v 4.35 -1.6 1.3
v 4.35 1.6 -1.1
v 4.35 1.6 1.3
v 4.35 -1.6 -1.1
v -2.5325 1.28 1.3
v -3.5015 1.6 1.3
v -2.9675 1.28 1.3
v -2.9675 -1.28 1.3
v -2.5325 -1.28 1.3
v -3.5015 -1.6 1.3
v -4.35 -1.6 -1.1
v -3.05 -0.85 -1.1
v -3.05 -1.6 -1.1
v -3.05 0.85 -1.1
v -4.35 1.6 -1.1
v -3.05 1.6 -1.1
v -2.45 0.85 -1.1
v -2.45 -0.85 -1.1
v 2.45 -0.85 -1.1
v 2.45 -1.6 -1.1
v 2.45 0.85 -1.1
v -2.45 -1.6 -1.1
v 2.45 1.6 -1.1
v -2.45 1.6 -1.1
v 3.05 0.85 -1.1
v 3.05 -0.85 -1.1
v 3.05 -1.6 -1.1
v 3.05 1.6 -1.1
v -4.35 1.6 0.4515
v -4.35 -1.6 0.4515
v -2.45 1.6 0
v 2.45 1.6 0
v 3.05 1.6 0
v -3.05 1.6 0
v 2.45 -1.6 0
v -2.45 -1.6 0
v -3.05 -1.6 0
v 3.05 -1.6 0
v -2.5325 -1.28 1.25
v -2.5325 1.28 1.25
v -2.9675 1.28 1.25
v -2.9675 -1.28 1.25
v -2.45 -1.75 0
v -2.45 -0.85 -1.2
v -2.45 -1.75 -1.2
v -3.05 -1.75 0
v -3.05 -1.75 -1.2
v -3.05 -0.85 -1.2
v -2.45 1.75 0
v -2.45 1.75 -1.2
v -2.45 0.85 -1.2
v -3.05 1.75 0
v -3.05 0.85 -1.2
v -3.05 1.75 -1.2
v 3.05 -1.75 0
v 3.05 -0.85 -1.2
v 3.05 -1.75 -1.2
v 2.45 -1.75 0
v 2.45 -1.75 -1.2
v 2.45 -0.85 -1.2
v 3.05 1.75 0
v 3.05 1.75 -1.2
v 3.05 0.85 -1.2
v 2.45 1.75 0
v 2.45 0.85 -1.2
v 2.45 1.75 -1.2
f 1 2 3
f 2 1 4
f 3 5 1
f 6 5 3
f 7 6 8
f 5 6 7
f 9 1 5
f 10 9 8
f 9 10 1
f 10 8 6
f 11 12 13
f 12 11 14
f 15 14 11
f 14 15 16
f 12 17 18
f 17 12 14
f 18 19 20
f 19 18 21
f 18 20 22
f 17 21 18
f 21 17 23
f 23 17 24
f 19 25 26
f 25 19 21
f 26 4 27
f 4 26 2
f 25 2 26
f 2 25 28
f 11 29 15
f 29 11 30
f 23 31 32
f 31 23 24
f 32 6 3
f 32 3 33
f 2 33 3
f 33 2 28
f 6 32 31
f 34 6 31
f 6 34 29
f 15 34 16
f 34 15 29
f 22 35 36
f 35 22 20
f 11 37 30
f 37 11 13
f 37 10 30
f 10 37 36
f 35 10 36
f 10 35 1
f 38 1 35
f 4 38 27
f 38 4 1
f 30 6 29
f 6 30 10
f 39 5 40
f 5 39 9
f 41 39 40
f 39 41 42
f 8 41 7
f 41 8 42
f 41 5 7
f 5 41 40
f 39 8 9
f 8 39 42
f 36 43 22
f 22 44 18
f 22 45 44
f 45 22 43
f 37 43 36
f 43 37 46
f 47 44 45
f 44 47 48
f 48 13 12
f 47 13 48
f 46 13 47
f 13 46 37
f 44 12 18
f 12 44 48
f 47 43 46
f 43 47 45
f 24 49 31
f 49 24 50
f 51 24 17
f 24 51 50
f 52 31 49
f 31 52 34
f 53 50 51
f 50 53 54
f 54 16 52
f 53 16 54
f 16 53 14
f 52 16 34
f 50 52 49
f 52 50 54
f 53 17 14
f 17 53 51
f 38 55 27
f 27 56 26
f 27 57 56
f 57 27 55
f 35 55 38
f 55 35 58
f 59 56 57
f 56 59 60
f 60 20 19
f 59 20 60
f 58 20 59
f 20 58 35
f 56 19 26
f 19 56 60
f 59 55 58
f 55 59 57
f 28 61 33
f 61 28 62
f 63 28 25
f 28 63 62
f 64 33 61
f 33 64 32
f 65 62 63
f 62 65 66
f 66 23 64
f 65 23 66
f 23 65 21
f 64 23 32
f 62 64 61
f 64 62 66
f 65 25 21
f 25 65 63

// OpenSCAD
dim=[8.7, 3.2, 2.4];
color_body=[0.15,0.15,0.15]; // dark gray
above=0.1;

// pad_pos=[5.5, 2.3]; // pads raster (assumed touching z=0)
pin_pos=[5.5, 2.6]; // pins centers at z=0
dim_pin=[0.6,0.9,1.2]; // simple pin
color_pin="white";

color_writing="white";


module abs25()
{
  translate([0,0,above])
  difference()
  {
    color(color_body)
      cube(dim, center=true);
    // body cut pin 1 mark
    translate([-dim[0]/2,0,dim[2]/2])
    rotate([0,-45,0])
      color(color_body)
        cube([dim[1]*0.5,dim[1]+0.1,dim[2]*0.5],center=true);
    // white cut pin 1 marking
    translate([-pin_pos[0]/2,0,dim[2]/2])
      color(color_writing)
        cube([dim[0]*0.05,dim[1]*0.8,0.1],center=true);
  }
  // add pins
  for(i=[-1:2:1])
    for(j=[-1:2:1])
      translate([i*pin_pos[0]/2,j*pin_pos[1]/2,-dim_pin[2]/2])
        color(color_pin)
          cube(dim_pin,center=true);
}

// scale(1/2.54) // scale required for kicad vrml
// scale is not applied here because object will loose
// color in freecad
abs25();
